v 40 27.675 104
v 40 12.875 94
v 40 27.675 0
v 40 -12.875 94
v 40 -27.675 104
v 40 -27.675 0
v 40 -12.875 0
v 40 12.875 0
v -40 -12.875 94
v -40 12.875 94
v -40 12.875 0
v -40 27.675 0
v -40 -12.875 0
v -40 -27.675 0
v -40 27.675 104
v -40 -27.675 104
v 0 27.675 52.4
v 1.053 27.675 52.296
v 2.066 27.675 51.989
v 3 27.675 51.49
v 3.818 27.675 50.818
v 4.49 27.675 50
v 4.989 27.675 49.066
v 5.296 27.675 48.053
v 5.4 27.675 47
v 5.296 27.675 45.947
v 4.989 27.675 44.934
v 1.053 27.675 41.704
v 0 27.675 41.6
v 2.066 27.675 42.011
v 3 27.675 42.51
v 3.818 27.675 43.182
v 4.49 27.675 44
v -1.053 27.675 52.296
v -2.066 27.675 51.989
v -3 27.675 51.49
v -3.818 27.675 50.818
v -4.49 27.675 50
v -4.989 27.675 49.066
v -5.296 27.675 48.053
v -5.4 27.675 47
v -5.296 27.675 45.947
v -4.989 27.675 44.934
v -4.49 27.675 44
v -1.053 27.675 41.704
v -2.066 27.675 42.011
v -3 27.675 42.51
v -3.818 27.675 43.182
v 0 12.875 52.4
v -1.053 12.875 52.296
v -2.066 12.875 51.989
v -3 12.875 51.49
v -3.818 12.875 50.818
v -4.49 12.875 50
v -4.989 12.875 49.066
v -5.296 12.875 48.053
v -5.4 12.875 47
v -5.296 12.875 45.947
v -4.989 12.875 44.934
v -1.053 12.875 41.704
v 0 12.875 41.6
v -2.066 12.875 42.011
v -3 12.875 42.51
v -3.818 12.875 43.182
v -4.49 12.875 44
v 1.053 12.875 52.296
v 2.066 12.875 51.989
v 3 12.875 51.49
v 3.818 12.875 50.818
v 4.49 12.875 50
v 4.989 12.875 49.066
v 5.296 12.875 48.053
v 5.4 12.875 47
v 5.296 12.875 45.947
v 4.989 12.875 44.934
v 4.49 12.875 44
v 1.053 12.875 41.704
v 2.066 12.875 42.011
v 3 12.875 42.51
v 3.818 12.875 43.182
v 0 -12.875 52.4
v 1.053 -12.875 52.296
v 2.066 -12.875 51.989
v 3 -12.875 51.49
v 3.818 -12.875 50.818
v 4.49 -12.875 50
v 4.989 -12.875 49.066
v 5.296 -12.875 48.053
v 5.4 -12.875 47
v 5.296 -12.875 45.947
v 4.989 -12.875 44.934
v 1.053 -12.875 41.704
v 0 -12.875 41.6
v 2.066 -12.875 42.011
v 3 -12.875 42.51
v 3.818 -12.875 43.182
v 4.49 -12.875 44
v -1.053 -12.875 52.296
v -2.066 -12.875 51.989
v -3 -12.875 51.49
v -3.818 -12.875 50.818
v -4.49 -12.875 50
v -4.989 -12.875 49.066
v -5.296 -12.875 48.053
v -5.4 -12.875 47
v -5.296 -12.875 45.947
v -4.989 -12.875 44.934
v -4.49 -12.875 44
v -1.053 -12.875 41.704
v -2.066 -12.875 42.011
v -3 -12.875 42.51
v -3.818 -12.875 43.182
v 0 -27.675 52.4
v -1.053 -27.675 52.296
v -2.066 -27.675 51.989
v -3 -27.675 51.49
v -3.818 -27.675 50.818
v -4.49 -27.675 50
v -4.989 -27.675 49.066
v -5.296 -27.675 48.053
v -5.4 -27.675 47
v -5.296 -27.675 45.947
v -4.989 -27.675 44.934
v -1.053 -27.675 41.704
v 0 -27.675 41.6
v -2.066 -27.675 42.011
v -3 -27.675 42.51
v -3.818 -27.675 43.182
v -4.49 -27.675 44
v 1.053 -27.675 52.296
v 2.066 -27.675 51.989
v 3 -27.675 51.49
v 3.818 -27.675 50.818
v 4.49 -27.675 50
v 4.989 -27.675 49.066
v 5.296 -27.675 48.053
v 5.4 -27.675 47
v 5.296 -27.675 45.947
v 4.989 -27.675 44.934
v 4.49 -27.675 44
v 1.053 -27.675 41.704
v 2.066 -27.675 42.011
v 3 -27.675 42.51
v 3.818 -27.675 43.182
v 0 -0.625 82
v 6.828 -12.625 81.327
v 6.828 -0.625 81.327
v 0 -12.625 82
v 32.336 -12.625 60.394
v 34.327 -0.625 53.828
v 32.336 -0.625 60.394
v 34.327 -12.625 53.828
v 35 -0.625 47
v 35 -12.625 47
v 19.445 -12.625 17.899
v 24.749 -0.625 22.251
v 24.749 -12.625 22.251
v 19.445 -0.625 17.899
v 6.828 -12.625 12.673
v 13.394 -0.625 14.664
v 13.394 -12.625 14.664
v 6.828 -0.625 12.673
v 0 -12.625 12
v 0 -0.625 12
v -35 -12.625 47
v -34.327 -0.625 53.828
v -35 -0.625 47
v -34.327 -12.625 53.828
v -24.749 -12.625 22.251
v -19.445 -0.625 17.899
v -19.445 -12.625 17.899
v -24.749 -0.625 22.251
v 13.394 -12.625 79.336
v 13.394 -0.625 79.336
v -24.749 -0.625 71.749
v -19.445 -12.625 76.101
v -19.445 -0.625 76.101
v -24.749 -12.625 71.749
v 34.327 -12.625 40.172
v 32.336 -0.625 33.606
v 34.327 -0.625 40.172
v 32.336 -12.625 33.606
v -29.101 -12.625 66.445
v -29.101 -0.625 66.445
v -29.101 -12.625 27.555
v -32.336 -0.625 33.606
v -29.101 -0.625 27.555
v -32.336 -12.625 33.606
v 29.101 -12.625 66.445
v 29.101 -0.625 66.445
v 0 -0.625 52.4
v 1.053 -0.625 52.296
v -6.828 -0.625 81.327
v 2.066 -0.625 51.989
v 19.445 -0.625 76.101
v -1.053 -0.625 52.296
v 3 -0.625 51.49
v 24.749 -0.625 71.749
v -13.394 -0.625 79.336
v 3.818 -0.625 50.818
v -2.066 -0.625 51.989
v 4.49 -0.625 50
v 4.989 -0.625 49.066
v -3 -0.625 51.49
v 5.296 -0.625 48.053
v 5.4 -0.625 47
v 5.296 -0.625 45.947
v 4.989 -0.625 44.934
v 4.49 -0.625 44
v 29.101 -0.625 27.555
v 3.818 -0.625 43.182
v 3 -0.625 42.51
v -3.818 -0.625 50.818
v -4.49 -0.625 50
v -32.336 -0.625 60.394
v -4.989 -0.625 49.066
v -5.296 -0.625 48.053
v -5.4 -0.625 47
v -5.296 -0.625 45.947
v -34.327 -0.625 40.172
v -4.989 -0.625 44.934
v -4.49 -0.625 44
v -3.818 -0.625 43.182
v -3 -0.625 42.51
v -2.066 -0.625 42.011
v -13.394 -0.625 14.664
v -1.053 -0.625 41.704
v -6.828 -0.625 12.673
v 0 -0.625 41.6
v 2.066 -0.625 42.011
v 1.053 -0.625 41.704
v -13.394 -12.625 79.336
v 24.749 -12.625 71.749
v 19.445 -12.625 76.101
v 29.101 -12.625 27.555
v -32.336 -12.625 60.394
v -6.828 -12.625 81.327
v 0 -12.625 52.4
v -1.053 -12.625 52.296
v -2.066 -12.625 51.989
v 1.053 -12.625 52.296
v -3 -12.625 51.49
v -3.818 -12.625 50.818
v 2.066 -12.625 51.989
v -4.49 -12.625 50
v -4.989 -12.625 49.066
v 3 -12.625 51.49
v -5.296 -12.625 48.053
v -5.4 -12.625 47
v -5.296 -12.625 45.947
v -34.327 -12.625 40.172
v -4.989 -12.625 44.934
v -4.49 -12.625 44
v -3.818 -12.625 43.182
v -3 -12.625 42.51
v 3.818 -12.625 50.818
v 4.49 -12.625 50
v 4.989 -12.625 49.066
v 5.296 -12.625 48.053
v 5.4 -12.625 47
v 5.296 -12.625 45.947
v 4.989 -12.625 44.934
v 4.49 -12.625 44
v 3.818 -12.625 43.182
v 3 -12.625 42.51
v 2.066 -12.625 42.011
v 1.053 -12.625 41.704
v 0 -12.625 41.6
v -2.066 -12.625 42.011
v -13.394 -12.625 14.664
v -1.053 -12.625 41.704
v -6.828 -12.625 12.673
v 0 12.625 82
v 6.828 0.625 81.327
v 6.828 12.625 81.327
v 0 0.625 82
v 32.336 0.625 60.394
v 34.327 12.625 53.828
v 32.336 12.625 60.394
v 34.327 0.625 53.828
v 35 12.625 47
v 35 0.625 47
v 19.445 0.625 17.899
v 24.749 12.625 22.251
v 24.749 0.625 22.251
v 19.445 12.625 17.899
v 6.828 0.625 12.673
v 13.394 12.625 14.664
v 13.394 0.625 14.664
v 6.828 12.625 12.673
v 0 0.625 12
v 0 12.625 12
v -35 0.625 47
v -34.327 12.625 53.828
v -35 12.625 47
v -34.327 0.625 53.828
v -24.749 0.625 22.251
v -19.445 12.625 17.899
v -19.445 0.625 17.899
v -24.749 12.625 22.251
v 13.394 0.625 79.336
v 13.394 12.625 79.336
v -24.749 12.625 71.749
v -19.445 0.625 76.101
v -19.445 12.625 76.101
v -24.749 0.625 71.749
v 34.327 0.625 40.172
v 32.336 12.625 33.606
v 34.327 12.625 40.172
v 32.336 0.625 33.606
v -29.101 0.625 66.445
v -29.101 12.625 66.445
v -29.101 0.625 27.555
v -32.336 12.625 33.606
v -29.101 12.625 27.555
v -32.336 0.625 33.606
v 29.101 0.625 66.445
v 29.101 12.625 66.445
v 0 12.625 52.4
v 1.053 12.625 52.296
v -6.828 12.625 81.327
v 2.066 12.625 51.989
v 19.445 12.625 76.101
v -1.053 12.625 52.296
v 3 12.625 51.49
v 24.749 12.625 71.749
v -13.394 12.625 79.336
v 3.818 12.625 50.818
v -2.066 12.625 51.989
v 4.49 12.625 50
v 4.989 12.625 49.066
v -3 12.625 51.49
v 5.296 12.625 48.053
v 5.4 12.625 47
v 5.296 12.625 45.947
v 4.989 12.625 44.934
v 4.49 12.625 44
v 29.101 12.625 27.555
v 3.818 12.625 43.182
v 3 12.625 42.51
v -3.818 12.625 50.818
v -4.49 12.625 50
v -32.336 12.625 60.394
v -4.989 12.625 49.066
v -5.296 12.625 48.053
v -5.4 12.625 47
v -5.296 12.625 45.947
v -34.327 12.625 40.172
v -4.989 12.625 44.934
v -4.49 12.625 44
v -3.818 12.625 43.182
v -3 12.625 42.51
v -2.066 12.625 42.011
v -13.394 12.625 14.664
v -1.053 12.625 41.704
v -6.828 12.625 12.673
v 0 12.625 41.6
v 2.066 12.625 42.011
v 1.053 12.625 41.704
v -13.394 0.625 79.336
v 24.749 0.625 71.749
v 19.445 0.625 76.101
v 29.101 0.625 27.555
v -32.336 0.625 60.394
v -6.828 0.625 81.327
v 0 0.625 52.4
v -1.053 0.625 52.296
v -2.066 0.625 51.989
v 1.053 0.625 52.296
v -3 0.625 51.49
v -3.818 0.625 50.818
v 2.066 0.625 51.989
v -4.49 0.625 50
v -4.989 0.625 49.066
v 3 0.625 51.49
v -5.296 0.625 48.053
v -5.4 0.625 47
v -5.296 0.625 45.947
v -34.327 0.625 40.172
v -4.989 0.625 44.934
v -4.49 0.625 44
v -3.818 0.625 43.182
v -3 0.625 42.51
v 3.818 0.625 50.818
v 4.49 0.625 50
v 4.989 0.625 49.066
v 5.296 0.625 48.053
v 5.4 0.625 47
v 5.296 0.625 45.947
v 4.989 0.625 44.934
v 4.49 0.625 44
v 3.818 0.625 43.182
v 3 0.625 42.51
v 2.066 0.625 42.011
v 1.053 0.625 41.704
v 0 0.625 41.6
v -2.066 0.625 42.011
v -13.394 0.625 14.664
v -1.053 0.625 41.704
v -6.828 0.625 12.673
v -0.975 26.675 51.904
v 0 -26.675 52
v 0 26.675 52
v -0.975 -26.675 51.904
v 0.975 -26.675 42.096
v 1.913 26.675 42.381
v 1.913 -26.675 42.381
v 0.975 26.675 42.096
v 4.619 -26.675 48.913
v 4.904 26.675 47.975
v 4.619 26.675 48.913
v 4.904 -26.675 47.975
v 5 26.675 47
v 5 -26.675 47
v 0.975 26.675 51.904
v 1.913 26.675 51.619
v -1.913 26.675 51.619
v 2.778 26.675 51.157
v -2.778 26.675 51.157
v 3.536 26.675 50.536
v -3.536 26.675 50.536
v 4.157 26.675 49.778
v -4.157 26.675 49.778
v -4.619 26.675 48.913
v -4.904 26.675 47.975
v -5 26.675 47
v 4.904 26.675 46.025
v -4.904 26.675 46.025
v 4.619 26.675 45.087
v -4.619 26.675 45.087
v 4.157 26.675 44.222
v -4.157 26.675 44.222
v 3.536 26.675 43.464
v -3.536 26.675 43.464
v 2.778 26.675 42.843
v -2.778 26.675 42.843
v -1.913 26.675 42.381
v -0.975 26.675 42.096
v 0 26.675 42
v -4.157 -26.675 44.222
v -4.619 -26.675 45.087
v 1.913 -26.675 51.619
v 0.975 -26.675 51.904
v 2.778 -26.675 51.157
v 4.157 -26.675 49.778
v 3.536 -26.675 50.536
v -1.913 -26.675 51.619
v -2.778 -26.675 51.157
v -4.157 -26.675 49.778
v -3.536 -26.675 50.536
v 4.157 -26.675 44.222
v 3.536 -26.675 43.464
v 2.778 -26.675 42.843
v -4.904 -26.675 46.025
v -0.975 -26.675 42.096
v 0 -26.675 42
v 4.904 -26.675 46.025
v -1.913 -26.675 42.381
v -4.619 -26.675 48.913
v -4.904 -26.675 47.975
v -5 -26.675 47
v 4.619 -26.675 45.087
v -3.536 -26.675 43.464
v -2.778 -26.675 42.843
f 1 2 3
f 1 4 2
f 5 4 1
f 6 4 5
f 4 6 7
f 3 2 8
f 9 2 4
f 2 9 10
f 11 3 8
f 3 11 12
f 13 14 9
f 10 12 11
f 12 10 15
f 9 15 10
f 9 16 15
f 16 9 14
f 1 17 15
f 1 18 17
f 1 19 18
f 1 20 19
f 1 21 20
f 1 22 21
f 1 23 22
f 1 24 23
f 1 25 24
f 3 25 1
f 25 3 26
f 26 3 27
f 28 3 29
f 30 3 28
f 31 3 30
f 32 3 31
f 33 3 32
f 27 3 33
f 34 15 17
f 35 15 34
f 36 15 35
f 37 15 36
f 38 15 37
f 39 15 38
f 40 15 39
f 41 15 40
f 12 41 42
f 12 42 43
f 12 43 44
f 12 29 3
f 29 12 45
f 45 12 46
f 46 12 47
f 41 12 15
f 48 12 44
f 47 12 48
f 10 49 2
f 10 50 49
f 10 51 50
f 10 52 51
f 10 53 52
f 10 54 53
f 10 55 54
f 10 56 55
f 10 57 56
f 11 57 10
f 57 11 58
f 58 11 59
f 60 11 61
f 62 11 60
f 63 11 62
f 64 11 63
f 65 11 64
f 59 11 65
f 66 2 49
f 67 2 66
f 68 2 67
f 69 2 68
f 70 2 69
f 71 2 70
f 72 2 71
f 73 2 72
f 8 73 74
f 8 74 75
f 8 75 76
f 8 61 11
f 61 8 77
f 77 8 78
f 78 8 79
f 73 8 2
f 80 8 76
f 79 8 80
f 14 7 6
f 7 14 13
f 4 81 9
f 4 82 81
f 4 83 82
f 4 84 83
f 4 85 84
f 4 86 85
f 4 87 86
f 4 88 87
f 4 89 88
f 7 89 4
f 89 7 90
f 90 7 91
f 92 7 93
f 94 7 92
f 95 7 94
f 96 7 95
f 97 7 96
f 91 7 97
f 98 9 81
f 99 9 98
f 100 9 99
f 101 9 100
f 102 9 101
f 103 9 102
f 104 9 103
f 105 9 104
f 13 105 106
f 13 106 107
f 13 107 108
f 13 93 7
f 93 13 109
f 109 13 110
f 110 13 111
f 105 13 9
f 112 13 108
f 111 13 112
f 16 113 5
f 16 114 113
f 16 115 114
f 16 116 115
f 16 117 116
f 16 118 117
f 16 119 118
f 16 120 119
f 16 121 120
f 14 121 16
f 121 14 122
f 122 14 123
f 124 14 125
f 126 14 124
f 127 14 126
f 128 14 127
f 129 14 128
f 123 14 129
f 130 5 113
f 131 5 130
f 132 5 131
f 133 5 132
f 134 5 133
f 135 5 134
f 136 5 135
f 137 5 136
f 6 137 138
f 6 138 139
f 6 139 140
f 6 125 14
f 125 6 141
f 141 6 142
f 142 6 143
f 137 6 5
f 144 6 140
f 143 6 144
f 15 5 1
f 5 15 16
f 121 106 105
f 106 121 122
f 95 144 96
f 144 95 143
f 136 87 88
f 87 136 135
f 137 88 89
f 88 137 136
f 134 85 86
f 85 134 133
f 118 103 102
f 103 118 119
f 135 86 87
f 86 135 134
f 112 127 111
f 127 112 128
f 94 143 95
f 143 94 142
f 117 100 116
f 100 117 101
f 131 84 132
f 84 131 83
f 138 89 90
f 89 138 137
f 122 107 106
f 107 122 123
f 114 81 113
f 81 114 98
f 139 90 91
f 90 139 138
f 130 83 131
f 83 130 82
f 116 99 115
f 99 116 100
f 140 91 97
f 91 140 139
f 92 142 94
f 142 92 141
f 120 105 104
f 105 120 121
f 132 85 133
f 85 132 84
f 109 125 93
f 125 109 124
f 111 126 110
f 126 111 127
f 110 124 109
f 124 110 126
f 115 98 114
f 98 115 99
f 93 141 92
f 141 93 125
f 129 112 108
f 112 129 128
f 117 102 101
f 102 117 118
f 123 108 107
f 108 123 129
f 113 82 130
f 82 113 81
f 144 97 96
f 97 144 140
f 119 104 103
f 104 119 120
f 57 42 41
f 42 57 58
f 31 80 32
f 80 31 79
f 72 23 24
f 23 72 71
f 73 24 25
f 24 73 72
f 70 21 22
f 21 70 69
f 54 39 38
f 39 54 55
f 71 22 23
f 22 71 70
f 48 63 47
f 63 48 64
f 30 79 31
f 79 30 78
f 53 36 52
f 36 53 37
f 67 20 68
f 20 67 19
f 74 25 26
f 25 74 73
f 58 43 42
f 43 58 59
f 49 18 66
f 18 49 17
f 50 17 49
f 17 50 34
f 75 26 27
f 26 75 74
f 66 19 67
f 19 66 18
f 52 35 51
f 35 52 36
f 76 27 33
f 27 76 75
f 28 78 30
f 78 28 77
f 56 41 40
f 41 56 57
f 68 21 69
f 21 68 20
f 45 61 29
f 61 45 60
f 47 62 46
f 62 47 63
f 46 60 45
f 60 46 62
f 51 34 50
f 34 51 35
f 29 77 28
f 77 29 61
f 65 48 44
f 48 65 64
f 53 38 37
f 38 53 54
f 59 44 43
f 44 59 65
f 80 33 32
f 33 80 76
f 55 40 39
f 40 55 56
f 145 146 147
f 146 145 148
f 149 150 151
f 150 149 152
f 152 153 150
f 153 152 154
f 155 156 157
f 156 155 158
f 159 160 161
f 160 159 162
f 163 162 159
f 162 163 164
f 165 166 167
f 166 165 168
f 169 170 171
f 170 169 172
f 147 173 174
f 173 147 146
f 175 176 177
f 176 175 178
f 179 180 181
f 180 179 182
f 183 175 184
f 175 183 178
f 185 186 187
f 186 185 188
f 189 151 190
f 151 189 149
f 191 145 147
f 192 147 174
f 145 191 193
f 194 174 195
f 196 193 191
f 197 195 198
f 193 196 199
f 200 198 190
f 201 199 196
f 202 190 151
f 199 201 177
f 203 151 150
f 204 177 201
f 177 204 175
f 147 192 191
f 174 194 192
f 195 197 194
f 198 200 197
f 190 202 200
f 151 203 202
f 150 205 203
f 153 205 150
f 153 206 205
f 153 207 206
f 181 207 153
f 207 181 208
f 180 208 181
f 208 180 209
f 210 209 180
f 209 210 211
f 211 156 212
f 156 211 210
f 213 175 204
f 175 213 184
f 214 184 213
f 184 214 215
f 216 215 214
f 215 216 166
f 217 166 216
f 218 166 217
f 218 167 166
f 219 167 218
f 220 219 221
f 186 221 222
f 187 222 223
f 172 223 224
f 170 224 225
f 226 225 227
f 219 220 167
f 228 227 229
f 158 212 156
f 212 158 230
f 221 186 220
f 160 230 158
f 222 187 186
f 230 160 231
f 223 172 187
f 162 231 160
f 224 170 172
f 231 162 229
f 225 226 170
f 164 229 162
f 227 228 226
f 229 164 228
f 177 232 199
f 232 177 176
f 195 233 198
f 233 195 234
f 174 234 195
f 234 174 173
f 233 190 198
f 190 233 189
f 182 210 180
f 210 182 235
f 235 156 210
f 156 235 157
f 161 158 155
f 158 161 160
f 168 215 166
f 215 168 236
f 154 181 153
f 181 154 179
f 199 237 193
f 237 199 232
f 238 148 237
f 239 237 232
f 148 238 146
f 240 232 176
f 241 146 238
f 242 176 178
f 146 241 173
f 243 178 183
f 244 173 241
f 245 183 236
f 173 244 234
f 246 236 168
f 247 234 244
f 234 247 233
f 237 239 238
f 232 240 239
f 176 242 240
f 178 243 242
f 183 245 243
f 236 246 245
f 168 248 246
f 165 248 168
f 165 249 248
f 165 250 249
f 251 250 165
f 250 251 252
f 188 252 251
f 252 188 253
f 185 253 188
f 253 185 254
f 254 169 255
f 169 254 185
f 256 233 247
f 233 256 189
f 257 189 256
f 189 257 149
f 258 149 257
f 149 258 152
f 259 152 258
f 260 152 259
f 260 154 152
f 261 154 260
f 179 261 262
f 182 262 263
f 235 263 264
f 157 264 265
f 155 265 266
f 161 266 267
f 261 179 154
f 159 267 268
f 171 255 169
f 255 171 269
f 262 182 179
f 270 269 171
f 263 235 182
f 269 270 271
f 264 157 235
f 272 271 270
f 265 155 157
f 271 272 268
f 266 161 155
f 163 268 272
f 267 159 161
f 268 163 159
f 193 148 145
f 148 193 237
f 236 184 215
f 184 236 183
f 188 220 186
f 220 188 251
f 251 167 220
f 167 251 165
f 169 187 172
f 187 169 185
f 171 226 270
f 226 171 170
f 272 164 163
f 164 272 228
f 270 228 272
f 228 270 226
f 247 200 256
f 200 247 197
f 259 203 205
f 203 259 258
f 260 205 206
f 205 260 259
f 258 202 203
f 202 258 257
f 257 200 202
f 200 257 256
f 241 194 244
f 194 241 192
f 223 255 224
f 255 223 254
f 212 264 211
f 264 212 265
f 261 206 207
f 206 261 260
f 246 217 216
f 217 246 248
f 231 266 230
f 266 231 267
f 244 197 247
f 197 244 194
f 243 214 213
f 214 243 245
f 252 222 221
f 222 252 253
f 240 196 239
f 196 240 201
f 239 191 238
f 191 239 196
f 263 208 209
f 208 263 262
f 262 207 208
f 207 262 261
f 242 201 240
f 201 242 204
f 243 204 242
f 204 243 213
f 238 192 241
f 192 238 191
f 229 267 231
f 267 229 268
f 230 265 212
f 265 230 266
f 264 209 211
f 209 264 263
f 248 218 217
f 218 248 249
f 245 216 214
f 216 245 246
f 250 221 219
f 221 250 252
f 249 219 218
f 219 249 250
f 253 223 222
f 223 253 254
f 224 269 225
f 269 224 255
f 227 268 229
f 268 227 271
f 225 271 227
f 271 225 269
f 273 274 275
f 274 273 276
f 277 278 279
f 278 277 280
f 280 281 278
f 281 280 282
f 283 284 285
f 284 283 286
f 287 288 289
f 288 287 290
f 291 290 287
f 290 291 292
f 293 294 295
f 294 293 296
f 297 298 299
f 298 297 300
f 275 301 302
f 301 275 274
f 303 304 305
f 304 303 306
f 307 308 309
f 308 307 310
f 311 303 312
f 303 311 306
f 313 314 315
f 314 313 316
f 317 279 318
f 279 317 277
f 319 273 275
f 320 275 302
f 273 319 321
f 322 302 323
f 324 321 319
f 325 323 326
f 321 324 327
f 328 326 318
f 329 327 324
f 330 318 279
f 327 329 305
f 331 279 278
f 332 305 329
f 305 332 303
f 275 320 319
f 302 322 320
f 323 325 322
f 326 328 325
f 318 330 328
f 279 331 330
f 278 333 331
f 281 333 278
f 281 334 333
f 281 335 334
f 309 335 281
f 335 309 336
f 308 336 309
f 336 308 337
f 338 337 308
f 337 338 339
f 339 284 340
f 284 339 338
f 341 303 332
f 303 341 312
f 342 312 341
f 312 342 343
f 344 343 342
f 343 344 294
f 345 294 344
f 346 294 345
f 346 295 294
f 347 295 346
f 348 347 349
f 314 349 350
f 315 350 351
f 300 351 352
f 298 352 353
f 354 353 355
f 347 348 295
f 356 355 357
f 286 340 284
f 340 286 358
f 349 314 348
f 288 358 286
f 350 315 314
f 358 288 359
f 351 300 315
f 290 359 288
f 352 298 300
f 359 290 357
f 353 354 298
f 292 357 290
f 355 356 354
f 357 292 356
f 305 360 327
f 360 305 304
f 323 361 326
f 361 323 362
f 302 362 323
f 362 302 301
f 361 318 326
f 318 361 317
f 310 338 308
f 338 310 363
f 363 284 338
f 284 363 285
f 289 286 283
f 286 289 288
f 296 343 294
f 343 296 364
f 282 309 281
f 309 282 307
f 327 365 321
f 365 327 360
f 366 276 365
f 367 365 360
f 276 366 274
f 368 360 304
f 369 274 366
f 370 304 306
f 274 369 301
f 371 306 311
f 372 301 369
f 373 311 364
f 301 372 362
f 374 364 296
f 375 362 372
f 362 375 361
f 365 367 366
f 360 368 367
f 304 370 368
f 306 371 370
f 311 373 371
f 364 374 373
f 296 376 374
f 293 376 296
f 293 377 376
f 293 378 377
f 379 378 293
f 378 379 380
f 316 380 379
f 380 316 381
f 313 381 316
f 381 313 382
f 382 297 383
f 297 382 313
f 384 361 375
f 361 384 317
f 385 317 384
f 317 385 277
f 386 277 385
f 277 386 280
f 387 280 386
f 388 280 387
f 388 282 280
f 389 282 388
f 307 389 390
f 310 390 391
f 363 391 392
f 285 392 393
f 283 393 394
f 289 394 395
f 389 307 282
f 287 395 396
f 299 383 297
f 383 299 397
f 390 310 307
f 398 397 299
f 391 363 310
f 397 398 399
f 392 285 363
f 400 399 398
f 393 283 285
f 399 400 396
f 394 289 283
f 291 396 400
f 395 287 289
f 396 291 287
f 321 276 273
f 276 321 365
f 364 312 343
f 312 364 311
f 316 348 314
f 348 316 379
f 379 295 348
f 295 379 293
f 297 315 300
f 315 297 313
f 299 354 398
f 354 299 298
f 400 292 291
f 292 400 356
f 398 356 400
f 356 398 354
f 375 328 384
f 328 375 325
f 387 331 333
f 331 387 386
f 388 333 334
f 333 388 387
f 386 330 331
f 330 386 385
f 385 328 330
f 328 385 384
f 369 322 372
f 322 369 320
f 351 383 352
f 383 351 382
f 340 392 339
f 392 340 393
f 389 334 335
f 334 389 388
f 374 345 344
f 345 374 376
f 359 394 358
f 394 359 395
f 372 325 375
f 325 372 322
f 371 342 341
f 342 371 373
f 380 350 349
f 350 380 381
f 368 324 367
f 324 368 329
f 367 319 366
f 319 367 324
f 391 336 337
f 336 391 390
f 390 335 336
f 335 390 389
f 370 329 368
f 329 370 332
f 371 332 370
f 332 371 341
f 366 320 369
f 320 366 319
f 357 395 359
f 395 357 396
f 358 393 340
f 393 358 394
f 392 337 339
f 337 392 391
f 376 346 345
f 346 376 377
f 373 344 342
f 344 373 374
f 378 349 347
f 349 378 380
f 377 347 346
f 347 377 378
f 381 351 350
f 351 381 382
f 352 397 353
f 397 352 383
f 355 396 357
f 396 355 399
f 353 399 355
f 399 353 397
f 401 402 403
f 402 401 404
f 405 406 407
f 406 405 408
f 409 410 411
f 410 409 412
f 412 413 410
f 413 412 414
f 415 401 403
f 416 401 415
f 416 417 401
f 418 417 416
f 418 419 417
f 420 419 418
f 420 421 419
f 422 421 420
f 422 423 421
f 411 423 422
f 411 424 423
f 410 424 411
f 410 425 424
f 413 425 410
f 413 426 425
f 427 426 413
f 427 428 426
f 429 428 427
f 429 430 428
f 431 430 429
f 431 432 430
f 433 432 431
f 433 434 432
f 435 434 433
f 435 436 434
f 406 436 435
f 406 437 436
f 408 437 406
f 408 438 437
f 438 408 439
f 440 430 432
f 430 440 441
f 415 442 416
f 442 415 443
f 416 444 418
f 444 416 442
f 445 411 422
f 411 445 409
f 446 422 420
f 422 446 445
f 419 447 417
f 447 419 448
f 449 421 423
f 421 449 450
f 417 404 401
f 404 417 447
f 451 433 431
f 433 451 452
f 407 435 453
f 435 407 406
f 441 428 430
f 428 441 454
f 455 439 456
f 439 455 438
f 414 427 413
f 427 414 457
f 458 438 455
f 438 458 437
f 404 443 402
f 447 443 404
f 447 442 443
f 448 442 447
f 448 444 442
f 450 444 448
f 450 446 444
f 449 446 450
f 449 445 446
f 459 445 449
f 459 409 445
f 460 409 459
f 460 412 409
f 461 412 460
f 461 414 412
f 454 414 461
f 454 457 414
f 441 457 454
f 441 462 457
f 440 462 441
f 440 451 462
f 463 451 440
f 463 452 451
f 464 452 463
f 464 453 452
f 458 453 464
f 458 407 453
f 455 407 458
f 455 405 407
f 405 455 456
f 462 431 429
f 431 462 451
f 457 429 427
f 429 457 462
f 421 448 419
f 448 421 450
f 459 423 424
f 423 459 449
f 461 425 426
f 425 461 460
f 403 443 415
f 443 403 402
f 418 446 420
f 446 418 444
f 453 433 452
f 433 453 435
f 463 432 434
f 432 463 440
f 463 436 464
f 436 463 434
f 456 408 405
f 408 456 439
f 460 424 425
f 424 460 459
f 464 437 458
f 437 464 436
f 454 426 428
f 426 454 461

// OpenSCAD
$fn = 32;

// ------------------------------------------------------------------------
// Trolley wheel set: wheels d70, fork 94 mm tall
// Every part is its own module, assembly() places every instance.
// ------------------------------------------------------------------------

// --- part 1 ---
module trolley_fork() {
  difference() {
    union() {
      translate([-40, 12.875, 0]) cube([80, 14.8, 94]);
      translate([-40, -27.675, 0]) cube([80, 14.8, 94]);
      translate([-40, -27.675, 94]) cube([80, 55.35, 10]);
    }
    translate([0, -20.275, 47]) rotate([90, 0, 0]) cylinder(h = 16.8, d = 10.8, center = true);
    translate([0, 20.275, 47]) rotate([90, 0, 0]) cylinder(h = 16.8, d = 10.8, center = true);
  }
}

// --- part 2 ---
module trolley_wheel() {
  difference() {
      translate([0, 0, 0]) cylinder(h = 12, d = 70);
      translate([0, 0, -1]) cylinder(h = 14, d = 10.8);
    }
}

// --- part 3 ---
module trolley_axle() {
  translate([0, 0, -26.675]) cylinder(h = 53.35, d = 10);
}

// --- assembly ---
module assembly() {
  color([0.80, 0.24, 0.20]) translate([0, 0, 0]) rotate([0, 0, 0]) trolley_fork();
  color([0.20, 0.45, 0.75]) translate([0, -0.625, 47]) rotate([90, 0, 0]) trolley_wheel();
  color([0.25, 0.62, 0.32]) translate([0, 12.625, 47]) rotate([90, 0, 0]) trolley_wheel();
  color([0.92, 0.70, 0.18]) translate([0, 0, 47]) rotate([90, 0, 0]) trolley_axle();
}

assembly();
